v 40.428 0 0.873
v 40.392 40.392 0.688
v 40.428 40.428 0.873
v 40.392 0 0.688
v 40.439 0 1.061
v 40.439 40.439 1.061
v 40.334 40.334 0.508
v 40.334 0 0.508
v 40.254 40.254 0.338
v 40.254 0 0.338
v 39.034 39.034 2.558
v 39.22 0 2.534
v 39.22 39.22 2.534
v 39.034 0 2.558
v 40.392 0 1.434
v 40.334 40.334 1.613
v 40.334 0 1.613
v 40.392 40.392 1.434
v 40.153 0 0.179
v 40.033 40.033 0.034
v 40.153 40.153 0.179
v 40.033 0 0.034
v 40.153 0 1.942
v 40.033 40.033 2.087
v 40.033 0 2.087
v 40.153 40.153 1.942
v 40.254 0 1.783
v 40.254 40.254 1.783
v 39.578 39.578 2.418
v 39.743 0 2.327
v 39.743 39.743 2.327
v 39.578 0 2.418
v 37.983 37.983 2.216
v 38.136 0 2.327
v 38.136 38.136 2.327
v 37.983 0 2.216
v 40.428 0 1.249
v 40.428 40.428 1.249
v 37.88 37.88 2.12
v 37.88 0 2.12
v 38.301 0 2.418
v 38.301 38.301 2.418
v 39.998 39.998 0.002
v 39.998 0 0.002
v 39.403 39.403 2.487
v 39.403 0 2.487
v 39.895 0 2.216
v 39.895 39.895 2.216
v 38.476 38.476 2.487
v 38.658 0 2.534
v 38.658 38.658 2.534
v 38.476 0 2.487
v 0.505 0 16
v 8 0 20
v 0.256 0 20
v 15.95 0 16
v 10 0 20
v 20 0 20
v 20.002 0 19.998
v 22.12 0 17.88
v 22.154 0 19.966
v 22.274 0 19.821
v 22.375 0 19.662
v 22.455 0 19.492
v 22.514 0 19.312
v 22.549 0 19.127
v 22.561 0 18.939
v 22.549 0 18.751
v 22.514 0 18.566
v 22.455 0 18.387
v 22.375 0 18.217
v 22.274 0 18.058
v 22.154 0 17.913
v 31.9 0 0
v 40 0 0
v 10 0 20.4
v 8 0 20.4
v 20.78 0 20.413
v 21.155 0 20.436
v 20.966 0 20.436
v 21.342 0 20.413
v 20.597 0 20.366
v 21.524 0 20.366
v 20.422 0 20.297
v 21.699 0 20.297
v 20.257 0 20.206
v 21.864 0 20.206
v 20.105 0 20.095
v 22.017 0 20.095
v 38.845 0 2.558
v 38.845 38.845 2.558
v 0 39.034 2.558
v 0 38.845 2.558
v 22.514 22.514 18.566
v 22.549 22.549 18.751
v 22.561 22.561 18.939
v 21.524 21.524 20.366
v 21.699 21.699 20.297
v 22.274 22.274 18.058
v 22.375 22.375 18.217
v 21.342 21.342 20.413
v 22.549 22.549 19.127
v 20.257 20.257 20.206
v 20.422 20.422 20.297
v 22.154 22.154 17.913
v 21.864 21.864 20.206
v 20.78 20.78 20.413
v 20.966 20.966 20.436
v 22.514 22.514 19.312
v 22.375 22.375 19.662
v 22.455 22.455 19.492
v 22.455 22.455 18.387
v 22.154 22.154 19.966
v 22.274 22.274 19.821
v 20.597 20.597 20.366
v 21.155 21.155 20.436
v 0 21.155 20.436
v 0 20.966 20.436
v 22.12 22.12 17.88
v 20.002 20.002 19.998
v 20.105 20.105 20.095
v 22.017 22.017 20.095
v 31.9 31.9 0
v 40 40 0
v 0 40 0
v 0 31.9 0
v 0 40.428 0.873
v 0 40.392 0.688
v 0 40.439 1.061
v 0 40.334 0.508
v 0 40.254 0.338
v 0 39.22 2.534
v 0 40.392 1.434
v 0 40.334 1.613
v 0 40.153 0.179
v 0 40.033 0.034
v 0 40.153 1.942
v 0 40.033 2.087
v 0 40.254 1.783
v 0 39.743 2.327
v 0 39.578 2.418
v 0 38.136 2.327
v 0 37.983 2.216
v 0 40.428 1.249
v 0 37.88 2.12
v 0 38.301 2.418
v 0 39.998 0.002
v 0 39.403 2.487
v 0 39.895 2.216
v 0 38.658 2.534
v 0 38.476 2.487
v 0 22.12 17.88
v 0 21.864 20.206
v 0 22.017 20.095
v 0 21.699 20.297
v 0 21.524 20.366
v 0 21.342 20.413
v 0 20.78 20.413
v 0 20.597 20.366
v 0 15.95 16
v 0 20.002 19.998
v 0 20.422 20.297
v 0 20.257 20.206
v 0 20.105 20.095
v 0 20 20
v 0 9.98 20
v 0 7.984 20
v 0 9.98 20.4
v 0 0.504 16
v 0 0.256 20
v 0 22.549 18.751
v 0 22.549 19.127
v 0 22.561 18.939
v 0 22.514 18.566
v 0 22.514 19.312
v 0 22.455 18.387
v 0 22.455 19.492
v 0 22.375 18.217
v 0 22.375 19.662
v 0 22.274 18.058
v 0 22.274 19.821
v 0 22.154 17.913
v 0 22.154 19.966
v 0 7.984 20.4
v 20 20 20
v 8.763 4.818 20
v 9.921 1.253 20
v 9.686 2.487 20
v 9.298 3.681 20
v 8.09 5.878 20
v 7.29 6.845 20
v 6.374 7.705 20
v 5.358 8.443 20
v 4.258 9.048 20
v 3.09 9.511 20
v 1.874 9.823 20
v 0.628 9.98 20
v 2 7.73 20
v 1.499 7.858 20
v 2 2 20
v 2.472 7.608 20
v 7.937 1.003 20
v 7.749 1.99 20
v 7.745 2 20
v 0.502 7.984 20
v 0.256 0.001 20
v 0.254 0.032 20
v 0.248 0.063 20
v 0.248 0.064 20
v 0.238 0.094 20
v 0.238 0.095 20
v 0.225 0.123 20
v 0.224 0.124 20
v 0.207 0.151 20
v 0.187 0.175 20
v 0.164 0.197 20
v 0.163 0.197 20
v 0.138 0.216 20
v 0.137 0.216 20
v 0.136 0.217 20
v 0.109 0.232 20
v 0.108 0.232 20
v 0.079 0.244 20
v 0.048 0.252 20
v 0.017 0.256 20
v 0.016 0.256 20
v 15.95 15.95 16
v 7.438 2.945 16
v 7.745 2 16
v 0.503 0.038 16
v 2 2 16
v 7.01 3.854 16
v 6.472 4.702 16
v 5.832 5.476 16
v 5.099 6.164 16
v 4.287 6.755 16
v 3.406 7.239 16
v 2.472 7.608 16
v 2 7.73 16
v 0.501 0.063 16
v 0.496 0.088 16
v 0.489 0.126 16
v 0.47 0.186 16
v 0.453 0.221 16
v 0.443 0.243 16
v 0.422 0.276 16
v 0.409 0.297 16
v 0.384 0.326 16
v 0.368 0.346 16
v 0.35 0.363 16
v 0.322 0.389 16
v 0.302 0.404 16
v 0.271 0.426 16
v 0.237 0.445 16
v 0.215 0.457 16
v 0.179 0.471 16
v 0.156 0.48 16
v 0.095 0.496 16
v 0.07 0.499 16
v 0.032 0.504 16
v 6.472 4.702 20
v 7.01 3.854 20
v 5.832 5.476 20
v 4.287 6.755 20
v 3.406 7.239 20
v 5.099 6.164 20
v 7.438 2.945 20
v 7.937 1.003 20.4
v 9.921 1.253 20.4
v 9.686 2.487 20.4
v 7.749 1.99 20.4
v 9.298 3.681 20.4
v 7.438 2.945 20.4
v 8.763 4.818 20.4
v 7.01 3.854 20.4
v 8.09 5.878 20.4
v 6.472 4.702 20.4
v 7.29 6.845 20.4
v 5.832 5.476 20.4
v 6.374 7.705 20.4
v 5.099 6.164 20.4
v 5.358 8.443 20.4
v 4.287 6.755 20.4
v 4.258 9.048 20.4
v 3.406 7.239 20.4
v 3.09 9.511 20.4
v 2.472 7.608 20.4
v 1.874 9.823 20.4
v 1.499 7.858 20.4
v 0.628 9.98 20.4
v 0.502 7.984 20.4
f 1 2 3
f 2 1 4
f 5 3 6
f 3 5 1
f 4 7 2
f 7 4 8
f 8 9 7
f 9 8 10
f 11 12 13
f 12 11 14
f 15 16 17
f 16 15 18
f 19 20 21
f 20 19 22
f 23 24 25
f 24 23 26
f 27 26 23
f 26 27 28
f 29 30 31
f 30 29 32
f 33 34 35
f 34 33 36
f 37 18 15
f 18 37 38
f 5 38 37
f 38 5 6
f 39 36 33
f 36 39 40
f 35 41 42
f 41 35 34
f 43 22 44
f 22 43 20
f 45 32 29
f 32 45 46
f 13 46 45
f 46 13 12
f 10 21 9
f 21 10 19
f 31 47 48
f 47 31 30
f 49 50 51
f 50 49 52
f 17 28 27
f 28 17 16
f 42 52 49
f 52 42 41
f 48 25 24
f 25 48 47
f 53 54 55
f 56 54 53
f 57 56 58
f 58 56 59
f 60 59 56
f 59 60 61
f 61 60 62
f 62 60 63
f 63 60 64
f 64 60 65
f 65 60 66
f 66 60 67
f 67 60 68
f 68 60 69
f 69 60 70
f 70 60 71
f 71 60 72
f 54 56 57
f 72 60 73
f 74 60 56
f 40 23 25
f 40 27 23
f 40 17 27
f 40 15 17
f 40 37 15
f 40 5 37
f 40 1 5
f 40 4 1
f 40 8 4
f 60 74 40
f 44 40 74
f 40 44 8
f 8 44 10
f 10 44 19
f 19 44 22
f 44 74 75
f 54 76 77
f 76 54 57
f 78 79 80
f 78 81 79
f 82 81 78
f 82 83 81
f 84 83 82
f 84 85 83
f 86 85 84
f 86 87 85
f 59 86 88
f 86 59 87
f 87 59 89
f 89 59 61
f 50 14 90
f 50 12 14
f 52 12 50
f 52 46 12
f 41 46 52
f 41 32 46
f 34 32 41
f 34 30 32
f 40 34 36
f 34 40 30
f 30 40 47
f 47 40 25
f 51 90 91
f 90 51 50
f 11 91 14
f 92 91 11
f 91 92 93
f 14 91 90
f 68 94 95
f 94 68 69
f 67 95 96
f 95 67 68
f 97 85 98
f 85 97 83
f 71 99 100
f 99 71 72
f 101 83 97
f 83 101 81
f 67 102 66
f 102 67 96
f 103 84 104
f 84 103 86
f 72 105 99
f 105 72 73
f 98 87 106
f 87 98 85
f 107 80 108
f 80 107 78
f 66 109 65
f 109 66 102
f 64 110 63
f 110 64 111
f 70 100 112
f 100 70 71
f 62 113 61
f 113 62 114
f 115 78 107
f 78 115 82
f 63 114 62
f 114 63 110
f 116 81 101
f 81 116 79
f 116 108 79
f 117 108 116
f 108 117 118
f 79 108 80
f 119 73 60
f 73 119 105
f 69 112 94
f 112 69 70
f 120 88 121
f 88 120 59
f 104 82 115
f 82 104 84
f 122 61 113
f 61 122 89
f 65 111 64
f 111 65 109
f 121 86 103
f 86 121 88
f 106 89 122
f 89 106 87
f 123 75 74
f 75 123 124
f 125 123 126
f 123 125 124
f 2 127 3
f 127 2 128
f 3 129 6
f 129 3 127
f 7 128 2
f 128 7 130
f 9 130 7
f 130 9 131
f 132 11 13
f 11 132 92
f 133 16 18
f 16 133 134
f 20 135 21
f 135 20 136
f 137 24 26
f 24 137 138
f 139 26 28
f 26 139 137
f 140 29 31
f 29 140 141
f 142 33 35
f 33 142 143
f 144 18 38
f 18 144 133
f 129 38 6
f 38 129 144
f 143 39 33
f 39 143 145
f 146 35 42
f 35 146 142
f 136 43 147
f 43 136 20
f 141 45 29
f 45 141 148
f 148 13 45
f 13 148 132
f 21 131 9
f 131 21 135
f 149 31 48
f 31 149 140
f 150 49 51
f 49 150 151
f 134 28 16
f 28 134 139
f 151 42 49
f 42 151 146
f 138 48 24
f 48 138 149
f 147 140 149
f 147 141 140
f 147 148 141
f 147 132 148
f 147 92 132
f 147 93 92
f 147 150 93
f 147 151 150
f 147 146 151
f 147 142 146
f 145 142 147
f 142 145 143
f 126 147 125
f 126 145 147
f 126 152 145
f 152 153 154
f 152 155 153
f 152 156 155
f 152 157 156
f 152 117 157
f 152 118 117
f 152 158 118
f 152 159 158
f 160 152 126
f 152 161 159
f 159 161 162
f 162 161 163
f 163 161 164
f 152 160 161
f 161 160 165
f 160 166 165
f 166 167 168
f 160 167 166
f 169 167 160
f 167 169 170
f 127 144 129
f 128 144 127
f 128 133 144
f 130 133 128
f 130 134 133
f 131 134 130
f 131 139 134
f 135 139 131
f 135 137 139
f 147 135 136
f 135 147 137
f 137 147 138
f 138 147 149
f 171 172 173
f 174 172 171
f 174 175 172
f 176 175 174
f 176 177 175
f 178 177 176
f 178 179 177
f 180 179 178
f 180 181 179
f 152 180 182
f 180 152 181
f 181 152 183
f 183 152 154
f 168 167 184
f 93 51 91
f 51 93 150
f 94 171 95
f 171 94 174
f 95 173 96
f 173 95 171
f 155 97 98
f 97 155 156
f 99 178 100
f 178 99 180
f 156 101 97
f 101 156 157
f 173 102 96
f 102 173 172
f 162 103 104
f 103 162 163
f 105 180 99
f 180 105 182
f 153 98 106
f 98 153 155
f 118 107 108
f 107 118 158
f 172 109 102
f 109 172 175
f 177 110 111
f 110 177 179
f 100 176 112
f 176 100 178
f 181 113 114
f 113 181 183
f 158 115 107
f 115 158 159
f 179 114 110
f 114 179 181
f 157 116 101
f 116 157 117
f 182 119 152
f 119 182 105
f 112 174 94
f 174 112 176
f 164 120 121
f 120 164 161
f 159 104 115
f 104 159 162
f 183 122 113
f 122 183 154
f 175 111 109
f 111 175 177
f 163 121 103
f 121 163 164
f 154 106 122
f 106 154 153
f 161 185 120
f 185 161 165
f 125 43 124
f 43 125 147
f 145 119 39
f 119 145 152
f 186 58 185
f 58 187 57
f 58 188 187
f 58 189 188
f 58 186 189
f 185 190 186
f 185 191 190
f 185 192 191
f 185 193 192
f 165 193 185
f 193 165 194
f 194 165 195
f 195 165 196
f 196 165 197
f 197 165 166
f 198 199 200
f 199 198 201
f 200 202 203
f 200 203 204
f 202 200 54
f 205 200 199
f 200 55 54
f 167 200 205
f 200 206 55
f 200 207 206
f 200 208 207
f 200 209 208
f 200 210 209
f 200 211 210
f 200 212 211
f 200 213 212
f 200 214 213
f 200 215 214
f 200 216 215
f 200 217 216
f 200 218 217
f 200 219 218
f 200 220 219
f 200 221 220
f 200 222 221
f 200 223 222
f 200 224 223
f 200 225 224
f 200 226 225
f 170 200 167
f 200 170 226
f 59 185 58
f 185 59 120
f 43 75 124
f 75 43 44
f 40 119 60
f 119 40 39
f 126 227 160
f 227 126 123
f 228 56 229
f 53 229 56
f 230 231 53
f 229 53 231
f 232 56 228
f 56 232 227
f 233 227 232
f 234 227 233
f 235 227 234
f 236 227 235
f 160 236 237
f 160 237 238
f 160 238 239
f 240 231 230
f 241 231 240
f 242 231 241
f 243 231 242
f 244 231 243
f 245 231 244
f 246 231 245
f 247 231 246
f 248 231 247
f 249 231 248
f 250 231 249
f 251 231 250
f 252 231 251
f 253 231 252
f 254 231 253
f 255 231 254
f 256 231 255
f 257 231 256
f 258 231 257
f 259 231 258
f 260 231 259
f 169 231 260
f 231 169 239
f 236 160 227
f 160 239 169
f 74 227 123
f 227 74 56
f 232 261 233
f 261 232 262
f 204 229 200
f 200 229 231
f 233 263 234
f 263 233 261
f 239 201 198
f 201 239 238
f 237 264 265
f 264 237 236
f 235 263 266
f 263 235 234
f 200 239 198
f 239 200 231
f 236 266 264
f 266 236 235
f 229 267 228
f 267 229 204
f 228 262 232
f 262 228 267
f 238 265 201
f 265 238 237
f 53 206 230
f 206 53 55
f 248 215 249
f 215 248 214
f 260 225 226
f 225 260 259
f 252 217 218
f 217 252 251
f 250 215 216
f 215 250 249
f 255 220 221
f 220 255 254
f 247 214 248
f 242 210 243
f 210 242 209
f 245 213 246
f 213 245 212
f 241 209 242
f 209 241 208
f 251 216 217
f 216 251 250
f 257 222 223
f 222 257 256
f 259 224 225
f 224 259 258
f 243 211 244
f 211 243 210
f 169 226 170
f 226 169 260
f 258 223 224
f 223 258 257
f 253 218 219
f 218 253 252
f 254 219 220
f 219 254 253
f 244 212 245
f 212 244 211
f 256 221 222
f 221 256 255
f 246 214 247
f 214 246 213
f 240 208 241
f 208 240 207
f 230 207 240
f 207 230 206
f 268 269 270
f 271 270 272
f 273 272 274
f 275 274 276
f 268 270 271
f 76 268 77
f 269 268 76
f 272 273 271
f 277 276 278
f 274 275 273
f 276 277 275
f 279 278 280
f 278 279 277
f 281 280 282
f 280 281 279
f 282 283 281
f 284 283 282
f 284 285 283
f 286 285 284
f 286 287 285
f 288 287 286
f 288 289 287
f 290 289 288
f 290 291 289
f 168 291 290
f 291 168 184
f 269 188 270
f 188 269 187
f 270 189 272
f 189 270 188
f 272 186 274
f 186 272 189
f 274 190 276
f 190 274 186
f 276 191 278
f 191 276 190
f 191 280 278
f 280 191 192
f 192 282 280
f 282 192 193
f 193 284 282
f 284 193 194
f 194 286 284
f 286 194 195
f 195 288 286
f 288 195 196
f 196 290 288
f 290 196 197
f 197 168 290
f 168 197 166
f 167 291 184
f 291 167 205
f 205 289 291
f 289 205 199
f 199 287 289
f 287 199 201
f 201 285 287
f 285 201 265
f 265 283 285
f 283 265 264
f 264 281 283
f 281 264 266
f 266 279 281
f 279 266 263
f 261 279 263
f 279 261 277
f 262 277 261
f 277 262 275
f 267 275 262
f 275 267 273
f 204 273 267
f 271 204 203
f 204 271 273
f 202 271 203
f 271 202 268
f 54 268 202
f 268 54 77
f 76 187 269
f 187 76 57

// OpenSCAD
footDims=[40,40,20];
decorDia=3;
decorOffset=decorDia/(2*sqrt(2));
fudge=0.1;
holeDia=20;
minWallThck=2;
sheetThck=0.4;

$fn=50;

upperDims=[footDims.x-footDims.z,footDims.y-footDims.z];
poly=[[upperDims.x,0],[upperDims.x,upperDims.y],[footDims.x+5,footDims.y+5],[footDims.x+5,0]];

difference(){
  
  union(){
    linear_extrude(footDims.z,scale=0.5) square([footDims.x,footDims.y]);
    for (i=[0,1]) rotate(i*90) mirror([0,i,0])
    intersection(){
      union(){
        translate([footDims.x-decorOffset,0,decorOffset]) rotate([-90,0,0]) cylinder(d=decorDia,h=footDims.y+2);
        translate([footDims.x-footDims.z+decorOffset,0,footDims.z-decorOffset]) rotate([-90,0,0]) cylinder(d=decorDia,h=footDims.y+2);
      }
      linear_extrude(footDims.z+decorDia) polygon(poly);
    }
  }
  translate([-fudge,-fudge,-fudge]) linear_extrude(footDims.z*0.8+fudge,scale=0.5) square(footDims.x*0.8+fudge);
  linear_extrude(footDims.z+fudge)
  intersection(){
    translate([minWallThck,minWallThck]) square(holeDia);
    circle(d=holeDia-minWallThck*2);
  }
  cylinder(d1=3,d2=0.5,h=footDims.z+fudge);
}

translate([0,0,footDims.z]) linear_extrude(sheetThck) 
  intersection(){
    square(holeDia);
    difference(){
      circle(d=holeDia);
      circle(d=holeDia-minWallThck*2);
    }
  }
